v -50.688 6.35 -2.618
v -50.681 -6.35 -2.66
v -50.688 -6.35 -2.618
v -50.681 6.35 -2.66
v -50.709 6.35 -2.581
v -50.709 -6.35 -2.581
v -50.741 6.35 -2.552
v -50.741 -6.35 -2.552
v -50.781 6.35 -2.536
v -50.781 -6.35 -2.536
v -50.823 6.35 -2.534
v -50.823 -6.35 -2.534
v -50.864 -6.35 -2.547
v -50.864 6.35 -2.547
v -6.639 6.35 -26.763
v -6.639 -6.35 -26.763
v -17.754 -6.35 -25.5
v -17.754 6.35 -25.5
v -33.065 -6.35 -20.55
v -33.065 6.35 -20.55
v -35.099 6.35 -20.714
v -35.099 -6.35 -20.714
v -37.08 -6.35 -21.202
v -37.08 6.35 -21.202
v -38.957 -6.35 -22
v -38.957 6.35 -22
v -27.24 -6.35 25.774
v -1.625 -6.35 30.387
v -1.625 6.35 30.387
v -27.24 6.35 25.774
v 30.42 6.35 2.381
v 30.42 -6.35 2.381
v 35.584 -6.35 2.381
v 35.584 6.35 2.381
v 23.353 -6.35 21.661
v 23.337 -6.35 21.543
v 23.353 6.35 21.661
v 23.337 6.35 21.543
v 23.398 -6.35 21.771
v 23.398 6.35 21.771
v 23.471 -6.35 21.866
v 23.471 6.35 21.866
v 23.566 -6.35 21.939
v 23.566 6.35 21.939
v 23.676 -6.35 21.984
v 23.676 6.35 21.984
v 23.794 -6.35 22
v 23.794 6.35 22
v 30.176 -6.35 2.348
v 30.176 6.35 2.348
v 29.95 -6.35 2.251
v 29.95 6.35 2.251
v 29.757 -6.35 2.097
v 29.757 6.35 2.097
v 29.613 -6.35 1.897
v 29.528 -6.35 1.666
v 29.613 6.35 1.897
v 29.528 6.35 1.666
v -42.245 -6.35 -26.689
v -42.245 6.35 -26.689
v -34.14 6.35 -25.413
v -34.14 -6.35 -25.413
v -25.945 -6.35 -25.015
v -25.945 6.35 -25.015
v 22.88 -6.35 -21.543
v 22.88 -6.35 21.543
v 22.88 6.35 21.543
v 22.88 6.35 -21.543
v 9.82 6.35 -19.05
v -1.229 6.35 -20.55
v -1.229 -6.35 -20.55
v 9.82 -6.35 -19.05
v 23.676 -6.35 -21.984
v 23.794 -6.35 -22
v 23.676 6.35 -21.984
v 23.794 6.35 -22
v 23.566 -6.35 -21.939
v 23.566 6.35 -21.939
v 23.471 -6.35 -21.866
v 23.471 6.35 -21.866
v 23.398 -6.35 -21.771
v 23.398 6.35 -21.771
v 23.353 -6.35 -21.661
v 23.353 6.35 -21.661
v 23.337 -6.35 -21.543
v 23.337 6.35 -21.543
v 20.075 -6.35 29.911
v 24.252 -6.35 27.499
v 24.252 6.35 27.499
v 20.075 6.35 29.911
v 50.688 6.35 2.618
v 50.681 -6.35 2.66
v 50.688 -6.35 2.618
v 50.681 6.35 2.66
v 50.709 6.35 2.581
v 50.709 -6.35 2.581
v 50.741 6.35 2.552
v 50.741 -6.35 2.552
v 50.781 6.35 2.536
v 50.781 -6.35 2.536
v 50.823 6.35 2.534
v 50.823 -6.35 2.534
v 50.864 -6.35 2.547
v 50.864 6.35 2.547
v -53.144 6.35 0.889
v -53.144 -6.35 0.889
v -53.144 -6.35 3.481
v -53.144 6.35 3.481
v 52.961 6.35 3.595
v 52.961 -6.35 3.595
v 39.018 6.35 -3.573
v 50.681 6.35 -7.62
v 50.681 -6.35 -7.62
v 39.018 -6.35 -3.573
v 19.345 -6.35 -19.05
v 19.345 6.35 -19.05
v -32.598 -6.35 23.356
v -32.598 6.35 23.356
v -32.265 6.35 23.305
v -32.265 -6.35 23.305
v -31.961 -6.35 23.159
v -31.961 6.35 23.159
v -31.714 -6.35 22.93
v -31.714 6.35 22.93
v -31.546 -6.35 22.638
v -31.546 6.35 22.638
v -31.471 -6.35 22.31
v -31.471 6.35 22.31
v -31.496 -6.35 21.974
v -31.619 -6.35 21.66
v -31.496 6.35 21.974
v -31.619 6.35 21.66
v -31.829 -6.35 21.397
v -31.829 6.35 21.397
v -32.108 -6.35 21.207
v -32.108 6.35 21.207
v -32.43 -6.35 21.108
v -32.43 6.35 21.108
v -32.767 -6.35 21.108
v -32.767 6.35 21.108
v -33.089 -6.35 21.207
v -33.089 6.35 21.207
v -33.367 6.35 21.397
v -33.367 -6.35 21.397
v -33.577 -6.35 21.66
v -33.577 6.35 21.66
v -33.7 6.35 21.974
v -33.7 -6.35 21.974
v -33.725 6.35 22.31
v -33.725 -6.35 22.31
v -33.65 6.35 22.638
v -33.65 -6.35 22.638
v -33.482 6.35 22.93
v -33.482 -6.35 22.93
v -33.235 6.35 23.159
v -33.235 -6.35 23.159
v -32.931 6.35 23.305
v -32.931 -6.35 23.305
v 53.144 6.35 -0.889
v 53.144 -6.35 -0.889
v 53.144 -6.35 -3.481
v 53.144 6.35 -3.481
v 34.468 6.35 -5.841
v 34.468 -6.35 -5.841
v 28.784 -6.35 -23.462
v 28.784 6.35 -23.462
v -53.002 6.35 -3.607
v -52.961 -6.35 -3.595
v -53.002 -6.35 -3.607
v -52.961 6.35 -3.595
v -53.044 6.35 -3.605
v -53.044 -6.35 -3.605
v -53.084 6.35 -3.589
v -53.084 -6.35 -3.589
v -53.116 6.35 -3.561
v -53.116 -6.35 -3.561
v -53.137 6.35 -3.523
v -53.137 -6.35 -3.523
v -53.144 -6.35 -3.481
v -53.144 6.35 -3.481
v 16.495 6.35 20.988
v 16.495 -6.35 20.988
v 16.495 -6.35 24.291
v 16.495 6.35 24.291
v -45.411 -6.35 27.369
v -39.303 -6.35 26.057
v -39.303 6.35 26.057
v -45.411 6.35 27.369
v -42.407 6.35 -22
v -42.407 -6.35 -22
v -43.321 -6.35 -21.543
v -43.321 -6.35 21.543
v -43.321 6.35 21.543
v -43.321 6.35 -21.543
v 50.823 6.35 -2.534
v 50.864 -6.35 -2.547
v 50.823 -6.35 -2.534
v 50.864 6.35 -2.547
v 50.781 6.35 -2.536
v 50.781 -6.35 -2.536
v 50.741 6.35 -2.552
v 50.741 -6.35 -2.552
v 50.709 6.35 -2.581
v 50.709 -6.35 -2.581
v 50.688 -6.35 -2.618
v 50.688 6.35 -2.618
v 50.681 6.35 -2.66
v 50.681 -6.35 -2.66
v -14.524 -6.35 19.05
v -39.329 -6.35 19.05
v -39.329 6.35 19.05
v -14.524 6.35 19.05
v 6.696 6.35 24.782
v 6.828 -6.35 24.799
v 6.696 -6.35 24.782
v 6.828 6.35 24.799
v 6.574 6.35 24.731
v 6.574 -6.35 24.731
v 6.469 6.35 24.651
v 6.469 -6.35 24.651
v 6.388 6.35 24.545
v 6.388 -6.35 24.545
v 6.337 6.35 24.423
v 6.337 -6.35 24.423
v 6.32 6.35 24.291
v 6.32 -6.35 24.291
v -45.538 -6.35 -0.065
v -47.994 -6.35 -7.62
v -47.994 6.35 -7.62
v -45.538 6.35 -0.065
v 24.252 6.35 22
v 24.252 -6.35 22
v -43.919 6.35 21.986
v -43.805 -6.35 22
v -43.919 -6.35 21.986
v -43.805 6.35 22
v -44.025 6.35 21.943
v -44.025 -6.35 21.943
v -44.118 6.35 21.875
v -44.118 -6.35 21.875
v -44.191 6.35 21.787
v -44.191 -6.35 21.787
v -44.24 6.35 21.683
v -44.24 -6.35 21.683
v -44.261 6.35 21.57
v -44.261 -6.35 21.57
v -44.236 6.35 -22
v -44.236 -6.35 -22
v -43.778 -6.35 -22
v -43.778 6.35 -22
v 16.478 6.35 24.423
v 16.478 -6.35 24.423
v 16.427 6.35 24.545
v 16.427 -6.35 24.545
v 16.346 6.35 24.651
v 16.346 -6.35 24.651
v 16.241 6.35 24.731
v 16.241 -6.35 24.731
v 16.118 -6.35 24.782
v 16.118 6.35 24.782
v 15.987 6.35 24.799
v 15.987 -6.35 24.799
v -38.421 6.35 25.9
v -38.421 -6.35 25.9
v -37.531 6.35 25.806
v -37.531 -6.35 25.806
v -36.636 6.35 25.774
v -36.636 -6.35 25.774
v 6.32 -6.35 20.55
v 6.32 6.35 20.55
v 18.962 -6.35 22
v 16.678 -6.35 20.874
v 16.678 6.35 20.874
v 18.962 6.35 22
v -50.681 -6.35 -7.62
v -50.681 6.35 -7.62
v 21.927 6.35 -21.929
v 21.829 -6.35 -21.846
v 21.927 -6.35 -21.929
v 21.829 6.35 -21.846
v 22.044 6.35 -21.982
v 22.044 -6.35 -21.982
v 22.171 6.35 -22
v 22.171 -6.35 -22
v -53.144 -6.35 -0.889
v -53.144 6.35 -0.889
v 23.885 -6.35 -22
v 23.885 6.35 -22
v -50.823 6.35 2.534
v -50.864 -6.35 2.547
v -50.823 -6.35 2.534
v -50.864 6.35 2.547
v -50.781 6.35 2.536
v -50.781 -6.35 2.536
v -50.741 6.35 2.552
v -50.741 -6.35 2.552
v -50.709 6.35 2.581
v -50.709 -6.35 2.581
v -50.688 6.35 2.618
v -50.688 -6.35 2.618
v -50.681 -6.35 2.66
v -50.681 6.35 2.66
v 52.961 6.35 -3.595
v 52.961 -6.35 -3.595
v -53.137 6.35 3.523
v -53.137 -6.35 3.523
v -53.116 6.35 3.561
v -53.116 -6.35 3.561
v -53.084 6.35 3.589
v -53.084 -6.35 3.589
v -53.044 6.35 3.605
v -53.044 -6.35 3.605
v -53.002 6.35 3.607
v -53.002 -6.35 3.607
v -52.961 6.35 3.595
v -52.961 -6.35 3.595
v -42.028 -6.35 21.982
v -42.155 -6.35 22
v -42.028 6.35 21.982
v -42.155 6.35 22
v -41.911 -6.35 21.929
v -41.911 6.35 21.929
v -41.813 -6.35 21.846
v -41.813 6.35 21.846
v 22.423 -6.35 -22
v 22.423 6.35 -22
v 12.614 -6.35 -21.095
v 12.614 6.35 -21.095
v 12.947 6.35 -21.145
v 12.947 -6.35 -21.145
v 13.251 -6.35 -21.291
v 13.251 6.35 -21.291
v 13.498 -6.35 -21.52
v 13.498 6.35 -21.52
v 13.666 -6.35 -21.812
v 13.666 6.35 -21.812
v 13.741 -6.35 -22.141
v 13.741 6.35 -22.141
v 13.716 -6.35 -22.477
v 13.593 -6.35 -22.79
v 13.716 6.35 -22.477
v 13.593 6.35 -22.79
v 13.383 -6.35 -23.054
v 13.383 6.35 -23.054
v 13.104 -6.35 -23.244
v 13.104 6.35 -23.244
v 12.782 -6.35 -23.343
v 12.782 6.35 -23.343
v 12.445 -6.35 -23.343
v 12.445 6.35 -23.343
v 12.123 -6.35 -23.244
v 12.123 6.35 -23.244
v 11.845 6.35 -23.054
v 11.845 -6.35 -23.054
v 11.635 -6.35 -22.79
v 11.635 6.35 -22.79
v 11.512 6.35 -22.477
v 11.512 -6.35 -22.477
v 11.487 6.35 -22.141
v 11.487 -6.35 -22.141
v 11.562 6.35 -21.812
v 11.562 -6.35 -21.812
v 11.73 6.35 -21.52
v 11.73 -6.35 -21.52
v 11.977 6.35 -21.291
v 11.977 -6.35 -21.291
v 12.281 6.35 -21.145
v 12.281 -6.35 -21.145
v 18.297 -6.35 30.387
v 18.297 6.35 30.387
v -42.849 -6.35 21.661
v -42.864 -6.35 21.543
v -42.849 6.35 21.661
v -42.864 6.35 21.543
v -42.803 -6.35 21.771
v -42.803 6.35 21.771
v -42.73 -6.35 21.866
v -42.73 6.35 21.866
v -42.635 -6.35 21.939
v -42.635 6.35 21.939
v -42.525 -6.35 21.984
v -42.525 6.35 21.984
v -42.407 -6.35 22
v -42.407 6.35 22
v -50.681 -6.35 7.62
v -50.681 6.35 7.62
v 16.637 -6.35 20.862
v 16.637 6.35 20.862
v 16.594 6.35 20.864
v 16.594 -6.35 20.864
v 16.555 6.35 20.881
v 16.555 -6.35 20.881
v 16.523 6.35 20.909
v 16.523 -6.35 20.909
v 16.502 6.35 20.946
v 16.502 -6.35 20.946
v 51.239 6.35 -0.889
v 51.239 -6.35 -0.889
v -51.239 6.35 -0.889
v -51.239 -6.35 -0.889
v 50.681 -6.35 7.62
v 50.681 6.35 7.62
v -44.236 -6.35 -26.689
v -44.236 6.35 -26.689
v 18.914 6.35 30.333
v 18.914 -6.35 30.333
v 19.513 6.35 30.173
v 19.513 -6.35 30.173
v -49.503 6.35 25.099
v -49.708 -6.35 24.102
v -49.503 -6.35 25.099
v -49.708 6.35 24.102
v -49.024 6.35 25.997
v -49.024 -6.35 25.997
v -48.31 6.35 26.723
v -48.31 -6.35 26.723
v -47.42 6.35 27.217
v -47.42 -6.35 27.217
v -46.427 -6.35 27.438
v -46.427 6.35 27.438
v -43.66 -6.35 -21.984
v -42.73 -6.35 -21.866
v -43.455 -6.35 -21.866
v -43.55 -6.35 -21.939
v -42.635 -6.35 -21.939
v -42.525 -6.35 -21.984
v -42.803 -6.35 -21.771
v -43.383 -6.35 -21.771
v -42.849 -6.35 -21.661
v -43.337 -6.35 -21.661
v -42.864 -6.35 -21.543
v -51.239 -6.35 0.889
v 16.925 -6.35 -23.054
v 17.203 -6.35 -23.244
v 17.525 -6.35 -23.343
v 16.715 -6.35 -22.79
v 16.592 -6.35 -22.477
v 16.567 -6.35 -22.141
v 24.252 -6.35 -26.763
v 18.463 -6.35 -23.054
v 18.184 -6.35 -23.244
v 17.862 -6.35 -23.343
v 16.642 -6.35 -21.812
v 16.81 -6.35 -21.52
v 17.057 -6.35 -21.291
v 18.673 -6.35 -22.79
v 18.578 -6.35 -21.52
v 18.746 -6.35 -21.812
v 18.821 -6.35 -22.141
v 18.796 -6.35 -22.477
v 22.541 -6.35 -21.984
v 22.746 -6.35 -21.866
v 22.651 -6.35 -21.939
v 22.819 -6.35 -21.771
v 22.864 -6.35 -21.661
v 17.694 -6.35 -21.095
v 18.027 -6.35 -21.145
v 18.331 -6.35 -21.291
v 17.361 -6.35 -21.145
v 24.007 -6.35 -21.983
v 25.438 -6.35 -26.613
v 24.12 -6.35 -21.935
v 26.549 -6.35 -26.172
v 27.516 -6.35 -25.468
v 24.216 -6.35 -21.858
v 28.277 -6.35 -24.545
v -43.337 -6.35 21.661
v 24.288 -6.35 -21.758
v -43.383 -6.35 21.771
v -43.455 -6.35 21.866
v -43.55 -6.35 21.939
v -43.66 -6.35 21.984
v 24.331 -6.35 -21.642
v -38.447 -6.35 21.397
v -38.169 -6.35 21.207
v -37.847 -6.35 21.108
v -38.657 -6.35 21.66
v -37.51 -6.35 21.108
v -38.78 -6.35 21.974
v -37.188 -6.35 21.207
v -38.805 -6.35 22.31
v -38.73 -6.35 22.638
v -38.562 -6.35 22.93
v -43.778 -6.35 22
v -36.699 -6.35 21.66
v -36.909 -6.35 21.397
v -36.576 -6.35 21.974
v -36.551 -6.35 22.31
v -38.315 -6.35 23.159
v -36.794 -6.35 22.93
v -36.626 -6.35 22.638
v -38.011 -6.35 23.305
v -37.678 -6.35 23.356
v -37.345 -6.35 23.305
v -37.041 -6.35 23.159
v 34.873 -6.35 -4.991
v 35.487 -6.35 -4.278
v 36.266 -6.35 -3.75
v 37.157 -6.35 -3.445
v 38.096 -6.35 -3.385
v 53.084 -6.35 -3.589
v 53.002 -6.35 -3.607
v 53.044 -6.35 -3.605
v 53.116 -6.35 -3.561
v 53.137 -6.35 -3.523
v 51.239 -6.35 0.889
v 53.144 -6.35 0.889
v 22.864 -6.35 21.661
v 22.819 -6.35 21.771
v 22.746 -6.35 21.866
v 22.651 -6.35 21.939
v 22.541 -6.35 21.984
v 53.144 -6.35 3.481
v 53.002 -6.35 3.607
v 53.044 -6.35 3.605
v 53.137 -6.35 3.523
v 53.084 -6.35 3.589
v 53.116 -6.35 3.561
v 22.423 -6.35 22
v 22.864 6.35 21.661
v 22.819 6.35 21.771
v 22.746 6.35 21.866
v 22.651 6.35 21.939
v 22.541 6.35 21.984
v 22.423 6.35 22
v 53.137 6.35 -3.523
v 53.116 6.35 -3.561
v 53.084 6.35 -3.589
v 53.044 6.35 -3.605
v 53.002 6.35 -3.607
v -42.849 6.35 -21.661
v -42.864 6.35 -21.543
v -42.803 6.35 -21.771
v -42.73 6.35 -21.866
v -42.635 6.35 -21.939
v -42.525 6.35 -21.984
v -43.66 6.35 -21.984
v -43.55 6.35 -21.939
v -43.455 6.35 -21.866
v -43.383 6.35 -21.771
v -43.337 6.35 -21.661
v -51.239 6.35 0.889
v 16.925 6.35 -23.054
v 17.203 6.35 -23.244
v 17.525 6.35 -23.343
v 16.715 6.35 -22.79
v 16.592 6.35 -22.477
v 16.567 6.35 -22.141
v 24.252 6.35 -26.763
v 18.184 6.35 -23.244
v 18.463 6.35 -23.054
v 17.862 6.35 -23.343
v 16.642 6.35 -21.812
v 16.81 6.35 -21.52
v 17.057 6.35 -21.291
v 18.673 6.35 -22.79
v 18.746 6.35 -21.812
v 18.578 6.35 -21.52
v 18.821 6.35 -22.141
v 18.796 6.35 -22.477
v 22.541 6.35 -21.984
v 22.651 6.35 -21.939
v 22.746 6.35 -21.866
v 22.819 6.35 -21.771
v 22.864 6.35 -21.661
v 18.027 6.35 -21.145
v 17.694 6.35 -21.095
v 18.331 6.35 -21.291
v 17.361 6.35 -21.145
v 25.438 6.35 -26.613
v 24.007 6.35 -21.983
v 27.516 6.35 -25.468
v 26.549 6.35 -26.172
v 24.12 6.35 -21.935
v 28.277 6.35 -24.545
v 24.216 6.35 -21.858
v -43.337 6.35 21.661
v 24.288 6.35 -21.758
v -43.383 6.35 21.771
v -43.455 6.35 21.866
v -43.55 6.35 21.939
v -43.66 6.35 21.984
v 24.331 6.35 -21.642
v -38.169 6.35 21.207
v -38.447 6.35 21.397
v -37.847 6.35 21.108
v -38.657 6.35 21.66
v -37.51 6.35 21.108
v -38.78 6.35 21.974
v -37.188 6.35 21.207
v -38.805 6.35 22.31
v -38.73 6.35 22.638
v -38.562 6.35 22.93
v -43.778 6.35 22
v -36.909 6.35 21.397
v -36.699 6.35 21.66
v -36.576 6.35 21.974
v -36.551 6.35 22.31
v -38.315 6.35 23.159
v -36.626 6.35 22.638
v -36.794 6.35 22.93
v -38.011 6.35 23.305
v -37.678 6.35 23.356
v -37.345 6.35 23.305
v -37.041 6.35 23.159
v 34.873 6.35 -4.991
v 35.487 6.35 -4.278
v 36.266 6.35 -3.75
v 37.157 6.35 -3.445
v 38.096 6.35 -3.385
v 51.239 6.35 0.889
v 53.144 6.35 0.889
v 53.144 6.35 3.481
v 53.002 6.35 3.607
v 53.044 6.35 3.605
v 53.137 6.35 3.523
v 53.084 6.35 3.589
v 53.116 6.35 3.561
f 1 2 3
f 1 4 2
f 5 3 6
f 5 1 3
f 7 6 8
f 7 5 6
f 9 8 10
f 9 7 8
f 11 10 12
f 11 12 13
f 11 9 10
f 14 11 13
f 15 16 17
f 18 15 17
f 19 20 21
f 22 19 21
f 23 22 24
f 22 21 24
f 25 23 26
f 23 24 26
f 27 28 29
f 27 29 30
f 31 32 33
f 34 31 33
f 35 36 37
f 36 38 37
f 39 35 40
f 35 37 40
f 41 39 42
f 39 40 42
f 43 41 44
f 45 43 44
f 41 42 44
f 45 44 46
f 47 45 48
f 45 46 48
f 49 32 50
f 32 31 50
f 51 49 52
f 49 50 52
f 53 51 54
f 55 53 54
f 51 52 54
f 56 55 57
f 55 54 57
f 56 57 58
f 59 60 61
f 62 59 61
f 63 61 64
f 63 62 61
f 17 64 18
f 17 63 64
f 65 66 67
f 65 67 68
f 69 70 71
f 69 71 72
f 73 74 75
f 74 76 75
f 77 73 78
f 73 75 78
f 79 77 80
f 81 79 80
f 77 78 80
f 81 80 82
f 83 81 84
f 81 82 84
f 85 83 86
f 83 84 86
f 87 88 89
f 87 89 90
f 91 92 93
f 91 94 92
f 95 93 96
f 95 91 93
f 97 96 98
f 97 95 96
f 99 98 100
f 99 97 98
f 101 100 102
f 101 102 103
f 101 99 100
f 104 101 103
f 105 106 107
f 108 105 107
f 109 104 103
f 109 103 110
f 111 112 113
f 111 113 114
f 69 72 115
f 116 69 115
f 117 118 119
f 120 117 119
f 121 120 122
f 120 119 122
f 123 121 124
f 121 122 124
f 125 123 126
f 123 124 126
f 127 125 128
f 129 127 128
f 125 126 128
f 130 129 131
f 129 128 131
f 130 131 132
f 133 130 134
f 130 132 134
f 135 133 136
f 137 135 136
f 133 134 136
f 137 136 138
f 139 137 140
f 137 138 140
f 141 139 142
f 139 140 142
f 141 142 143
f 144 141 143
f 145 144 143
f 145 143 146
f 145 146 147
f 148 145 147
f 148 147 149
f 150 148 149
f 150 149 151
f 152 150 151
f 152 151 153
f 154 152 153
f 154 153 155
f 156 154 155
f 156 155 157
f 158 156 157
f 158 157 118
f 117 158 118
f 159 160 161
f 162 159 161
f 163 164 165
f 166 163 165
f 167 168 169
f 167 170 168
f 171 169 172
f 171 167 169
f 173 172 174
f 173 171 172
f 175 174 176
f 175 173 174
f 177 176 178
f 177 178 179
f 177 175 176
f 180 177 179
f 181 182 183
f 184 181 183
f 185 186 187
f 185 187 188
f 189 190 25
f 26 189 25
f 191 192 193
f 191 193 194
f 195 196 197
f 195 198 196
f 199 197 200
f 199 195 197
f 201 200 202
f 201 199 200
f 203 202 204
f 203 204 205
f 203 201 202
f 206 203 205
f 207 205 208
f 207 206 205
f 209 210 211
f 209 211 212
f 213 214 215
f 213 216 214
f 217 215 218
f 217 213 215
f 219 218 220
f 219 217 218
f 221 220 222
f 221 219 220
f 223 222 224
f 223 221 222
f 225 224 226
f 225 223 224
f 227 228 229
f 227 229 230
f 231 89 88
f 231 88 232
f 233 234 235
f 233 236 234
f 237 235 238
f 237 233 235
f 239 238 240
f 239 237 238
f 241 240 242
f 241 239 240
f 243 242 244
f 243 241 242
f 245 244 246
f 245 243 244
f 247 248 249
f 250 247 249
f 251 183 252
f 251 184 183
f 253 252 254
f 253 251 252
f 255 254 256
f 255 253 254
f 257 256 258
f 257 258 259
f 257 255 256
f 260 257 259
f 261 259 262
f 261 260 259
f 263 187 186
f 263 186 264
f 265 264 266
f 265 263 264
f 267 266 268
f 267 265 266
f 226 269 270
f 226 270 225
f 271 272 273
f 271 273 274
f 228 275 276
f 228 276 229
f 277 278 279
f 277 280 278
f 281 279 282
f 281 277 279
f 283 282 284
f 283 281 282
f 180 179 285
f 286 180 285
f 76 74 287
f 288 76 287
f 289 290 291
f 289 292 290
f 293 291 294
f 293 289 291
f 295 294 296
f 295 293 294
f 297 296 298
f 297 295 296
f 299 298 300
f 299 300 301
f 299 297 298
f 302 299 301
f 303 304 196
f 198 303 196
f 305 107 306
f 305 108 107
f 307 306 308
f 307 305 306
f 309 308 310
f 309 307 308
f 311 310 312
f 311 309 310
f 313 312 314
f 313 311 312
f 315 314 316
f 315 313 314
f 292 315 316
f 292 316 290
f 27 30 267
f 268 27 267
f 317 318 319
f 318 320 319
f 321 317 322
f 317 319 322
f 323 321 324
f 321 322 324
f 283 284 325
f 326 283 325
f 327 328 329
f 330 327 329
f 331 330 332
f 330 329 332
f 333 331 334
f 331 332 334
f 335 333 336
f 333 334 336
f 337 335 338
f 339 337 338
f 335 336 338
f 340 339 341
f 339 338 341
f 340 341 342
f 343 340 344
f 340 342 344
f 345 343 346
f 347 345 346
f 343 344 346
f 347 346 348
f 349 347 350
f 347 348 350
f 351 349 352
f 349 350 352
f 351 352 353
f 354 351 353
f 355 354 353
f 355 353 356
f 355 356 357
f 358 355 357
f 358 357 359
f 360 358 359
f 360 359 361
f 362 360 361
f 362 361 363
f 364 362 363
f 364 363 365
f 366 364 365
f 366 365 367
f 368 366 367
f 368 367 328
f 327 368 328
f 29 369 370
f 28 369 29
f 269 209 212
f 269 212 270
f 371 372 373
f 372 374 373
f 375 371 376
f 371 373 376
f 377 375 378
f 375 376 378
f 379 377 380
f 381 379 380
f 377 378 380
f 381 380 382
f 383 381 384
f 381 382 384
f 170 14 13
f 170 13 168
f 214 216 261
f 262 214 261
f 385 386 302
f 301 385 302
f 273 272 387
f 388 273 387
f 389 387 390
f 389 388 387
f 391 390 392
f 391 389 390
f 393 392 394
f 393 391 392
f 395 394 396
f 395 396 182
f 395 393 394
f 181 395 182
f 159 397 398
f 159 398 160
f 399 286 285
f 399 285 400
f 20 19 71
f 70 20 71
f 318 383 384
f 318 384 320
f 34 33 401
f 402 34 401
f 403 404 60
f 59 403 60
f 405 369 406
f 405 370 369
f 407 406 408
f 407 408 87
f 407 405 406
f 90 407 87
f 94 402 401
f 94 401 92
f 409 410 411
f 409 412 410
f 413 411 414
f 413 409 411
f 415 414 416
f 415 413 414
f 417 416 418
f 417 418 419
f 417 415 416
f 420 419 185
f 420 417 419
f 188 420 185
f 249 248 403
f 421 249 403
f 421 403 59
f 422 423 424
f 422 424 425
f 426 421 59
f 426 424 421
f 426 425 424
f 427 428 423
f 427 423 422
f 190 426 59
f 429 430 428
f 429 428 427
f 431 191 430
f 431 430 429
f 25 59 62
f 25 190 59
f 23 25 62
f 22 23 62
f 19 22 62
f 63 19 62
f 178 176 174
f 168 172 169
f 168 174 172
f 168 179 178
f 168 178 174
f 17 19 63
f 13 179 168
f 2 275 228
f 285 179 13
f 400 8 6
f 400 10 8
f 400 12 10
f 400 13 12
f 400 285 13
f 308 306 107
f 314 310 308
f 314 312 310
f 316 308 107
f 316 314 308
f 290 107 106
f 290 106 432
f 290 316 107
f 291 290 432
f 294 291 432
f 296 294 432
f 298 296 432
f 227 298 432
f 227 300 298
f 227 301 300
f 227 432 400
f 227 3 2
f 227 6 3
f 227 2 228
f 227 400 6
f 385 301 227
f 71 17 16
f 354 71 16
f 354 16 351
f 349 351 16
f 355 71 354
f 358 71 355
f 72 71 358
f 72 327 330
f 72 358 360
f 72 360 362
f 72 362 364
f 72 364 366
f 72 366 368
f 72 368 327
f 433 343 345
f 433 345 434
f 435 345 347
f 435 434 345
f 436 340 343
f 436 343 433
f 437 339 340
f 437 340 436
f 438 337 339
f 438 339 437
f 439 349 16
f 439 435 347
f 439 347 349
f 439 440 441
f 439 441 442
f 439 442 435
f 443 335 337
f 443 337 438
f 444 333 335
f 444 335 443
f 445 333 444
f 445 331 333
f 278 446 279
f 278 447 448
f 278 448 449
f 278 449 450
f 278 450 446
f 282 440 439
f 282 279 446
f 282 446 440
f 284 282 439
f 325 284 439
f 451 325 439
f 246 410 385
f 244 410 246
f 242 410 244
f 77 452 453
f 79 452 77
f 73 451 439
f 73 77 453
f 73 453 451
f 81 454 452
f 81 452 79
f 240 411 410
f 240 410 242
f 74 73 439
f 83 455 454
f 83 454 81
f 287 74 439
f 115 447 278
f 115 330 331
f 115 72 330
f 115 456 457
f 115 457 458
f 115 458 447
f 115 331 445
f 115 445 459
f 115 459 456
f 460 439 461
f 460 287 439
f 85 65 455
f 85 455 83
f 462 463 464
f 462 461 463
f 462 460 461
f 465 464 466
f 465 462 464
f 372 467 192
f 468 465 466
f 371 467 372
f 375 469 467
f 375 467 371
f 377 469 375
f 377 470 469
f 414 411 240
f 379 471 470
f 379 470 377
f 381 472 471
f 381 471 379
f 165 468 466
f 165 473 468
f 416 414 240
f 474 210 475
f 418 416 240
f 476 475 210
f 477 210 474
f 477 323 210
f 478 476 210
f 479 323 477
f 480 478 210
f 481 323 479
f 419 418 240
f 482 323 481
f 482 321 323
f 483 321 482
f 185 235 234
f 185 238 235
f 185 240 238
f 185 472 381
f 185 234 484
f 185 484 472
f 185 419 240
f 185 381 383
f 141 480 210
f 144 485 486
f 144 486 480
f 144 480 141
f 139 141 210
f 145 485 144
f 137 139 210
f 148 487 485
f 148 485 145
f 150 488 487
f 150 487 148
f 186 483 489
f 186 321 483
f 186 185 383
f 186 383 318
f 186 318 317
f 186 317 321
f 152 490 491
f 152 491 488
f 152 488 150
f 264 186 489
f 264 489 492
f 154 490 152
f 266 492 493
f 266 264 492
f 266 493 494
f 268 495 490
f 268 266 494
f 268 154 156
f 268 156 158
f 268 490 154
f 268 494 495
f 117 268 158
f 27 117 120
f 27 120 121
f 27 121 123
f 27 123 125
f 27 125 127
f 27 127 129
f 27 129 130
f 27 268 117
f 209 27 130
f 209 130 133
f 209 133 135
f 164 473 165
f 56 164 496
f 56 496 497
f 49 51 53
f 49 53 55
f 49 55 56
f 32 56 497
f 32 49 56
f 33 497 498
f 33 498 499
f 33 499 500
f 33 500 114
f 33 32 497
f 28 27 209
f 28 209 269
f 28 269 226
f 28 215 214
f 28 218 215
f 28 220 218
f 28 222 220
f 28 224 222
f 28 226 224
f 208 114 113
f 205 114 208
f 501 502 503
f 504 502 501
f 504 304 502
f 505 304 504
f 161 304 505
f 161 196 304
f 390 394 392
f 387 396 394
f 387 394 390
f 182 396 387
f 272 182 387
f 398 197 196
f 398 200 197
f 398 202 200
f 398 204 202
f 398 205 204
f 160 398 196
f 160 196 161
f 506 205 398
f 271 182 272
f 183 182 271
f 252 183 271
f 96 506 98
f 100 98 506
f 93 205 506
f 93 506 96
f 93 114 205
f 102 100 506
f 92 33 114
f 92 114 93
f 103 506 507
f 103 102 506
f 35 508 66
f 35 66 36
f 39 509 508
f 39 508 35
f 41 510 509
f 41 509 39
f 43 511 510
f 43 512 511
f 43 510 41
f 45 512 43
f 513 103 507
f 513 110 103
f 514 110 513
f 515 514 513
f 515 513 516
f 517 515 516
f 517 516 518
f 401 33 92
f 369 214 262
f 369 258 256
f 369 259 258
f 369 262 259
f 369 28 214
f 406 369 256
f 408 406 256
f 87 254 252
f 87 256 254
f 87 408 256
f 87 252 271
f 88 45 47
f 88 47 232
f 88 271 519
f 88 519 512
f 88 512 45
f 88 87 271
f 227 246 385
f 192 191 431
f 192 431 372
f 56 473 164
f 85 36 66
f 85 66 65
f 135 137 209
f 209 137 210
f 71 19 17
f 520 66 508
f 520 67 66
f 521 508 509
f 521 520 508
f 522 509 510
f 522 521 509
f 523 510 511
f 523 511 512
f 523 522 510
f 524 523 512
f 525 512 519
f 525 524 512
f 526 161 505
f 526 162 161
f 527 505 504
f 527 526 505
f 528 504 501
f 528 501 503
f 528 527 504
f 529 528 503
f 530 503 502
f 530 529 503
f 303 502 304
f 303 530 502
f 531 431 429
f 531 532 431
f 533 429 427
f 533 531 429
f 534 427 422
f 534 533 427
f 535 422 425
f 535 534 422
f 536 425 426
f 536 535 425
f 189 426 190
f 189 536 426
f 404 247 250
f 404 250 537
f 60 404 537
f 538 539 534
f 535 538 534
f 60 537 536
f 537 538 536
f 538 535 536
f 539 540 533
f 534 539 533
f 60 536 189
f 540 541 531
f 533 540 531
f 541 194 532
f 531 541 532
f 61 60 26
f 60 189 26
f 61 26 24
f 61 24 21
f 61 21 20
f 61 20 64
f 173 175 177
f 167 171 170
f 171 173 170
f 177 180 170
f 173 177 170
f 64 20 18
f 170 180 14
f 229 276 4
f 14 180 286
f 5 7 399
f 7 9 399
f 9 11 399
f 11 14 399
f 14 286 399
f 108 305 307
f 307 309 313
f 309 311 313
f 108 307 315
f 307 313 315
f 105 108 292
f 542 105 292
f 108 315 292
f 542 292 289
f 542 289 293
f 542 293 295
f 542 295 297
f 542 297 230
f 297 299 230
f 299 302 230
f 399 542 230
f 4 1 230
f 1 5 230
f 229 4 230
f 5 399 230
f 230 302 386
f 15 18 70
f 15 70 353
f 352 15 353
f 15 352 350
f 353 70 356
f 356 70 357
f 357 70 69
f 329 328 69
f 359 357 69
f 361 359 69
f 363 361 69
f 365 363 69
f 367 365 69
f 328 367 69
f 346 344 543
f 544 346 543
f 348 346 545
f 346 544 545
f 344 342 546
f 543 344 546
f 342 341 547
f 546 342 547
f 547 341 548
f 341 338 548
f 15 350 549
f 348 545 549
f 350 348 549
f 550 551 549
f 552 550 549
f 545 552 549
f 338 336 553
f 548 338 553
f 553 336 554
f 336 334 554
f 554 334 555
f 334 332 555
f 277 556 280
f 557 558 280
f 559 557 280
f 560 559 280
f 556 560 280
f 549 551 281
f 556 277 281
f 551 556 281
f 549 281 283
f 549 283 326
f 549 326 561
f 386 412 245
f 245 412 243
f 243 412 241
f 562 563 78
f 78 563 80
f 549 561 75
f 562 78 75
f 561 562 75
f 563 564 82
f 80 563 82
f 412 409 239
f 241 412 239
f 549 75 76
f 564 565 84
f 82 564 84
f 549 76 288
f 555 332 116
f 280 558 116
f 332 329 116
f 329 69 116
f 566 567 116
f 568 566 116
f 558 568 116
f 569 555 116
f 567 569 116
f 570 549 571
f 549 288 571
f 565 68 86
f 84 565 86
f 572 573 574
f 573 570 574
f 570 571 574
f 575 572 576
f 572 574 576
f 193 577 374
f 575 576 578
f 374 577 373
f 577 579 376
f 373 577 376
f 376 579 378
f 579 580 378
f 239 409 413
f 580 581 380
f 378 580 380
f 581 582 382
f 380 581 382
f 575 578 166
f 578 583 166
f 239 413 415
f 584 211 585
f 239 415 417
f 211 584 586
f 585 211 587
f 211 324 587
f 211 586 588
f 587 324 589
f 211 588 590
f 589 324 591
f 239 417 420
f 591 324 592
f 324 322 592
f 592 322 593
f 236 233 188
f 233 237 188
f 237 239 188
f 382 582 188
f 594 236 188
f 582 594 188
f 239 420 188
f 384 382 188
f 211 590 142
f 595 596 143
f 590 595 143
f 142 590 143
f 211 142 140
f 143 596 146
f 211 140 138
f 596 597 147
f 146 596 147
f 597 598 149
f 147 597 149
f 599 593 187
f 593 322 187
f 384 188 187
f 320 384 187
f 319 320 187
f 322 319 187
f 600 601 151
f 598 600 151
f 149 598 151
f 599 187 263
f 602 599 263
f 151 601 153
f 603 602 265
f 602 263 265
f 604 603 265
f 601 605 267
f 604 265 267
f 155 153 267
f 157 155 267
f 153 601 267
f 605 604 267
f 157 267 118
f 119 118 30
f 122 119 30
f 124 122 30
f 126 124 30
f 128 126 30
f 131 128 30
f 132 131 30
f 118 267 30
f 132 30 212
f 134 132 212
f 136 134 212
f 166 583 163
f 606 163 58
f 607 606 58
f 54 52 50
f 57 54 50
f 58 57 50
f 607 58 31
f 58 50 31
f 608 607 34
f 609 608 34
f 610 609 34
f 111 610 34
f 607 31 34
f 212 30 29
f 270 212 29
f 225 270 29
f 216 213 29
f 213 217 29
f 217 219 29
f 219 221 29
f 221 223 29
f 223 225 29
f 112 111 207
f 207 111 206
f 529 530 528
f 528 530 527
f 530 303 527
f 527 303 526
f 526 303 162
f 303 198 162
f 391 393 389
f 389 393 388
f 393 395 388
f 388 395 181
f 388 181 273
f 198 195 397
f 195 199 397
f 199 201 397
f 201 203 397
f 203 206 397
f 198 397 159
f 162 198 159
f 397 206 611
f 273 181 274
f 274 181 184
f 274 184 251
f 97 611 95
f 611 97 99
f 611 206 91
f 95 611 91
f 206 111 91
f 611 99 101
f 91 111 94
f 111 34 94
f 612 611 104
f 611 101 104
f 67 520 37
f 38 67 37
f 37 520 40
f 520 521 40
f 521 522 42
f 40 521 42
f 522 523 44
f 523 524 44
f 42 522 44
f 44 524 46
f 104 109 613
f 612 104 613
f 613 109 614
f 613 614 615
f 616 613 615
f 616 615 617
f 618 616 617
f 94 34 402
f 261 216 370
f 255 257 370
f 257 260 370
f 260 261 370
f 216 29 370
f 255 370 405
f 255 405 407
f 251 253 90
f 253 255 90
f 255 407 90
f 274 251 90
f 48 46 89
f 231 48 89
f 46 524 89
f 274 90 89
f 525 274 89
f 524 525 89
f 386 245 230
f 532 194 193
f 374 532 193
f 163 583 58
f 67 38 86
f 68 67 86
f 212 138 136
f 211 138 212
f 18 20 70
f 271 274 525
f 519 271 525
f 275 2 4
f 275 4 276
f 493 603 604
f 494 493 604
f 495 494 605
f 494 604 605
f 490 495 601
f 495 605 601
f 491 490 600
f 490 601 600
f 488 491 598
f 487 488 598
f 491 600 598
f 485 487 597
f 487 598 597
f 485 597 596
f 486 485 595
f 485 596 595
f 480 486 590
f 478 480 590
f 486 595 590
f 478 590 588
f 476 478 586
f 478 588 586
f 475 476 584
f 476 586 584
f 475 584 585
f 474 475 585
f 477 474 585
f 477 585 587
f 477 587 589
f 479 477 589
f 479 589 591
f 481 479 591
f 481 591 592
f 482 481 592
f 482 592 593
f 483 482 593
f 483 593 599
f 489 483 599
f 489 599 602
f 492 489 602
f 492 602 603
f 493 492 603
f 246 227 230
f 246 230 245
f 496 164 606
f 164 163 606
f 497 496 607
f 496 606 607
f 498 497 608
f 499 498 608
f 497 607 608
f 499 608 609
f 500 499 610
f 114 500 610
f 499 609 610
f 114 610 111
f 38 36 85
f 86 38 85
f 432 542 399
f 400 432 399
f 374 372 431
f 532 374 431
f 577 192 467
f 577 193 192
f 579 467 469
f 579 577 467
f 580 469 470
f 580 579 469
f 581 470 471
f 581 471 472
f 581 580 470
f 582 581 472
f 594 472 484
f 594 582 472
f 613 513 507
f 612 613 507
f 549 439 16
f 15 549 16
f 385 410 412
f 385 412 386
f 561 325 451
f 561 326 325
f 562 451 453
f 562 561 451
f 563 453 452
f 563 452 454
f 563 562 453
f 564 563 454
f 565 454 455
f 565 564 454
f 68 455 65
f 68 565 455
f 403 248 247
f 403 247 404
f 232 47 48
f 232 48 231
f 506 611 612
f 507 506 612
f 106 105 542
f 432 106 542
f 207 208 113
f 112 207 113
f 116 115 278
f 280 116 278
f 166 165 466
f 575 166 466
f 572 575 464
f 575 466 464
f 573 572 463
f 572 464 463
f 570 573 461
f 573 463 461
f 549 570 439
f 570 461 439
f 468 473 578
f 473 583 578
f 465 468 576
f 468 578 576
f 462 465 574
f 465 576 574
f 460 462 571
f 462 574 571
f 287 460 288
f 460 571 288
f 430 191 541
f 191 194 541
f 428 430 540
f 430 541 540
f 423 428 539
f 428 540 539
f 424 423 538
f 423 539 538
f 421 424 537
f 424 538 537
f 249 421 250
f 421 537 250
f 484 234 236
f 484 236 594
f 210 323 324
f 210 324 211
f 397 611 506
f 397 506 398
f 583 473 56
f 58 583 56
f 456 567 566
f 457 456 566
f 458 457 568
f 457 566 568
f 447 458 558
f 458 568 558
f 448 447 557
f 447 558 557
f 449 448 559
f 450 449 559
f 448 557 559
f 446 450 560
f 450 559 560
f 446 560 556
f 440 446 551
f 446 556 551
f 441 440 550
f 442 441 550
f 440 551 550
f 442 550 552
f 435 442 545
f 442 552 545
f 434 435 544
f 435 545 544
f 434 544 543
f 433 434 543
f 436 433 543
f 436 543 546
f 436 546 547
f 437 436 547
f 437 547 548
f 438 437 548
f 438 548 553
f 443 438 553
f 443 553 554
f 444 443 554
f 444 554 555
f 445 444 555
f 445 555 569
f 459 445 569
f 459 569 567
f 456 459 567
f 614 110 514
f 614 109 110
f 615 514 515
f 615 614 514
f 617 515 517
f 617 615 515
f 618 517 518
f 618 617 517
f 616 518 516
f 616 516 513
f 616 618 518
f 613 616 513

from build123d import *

# Parameters (mm, degrees)
BOSS_EXTRUDE1_DEPTH        = 6.35
BOSS_EXTRUDE1_DEPTH_BACK   = 6.35
BOSS_EXTRUDE1_2_DEPTH      = 6.35
BOSS_EXTRUDE1_2_DEPTH_BACK = 6.35
BOSS_EXTRUDE2_DEPTH        = 6.35
BOSS_EXTRUDE2_DEPTH_BACK   = 6.35
SKETCH3_W                  = 0.4572
SKETCH3_H                  = 44.508
BOSS_EXTRUDE4_DEPTH        = 6.35
BOSS_EXTRUDE4_DEPTH_BACK   = 6.35
SKETCH8_W                  = 2.032
SKETCH8_H                  = 1.778
CUT_EXTRUDE1_DEPTH         = 63.522062345
FILLET1_R                  = 0.4572
FILLET2_R                  = 0.9144
FILLET3_R                  = 3.556
FILLET6_R                  = 12.7
SKETCH9_R                  = 1.1303
CUT_EXTRUDE2_DEPTH         = 63.522062345
FILLET7_R                  = 0.127
FILLET8_R                  = 0.508
FILLET9_R                  = 76.2
SKETCH12_W                 = 3.975578287
SKETCH12_H                 = 4.68929279
SKETCH12_W_2               = 5.470600001
SKETCH12_H_2               = 8.387314833
CUT_EXTRUDE3_DEPTH         = 63.522062345
FILLET10_R                 = 0.127


with BuildPart() as part:
    # Sketch2 → Boss-Extrude1 (new, two sides: drawn at the far end of the back side and taken through both)
    with BuildSketch(Plane(origin=(0, 0, 0), x_dir=(1, 0, 0), z_dir=(0, 1, 0)).offset(-BOSS_EXTRUDE1_DEPTH_BACK)):
        with BuildLine():
            Line((9.819911786, 19.050210052), (19.344911786, 19.050210052))
            Line((19.344911786, 19.050210052), (21.965511899, 22))
            Line((21.965511899, 22), (24.251511899, 22))
            Line((24.251511899, 22), (29.687111899, -2.381342584))
            Line((29.687111899, -2.381342584), (35.584296061, -2.381342584))
            Line((35.584296061, -2.381342584), (50.68062, -7.62))
            Line((50.68062, -7.62), (50.68062, 7.62))
            Line((50.68062, 7.62), (35.584296061, 2.381342584))
            Line((35.584296061, 2.381342584), (28.784210924, 23.462125012))
            ThreePointArc((28.784210924, 23.462125012), (27.055039043, 25.850117603), (24.251511899, 26.762685167))
            Line((24.251511899, 26.762685167), (-6.638632099, 26.762685167))
            Line((-6.638632099, 26.762685167), (-30.153140375, 24.092168337))
            Line((-30.153140375, 24.092168337), (-42.245281802, 26.68929279))
            Line((-42.245281802, 26.68929279), (-48.211266614, 26.68929279))
            Line((-48.211266614, 26.68929279), (-48.211266614, 22))
            Line((-48.211266614, 22), (-38.957383068, 22))
            Line((-38.957383068, 22), (-36.496303445, 20.550210052))
            Line((-36.496303445, 20.550210052), (-1.229088214, 20.550210052))
            Line((-1.229088214, 20.550210052), (9.819911786, 19.050210052))
        make_face()
    extrude(amount=BOSS_EXTRUDE1_DEPTH + BOSS_EXTRUDE1_DEPTH_BACK)



with BuildPart() as body_2:
    # Sketch2 → Boss-Extrude1 2 (new, two sides: drawn at the far end of the back side and taken through both)
    with BuildSketch(Plane(origin=(0, 0, 0), x_dir=(1, 0, 0), z_dir=(0, 1, 0)).offset(-BOSS_EXTRUDE1_2_DEPTH_BACK)):
        Polygon((-50.68062, 7.62), (-47.994229245, 7.62), (-45.538273994, 0.064709726), (-44.235688327, -22), (-41.949688327, -22), (-39.329088214, -19.050210052), (-14.524057774, -19.050210052), (6.319911674, -20.5502101), (6.319911674, -24.799314833), (16.494911898, -24.799314833), (16.494911898, -22), (16.494911898, -20.7842203), (18.962447951, -22), (29.7221119, -22), (29.7221119, -24.341022744), (19.249626804, -30.387314833), (-1.624639293, -30.387314833), (-27.239820872, -25.774174137), (-37.984514025, -25.774174137), (-49.463347649, -28.239573642), (-50.68062, -7.62), align=None)
    extrude(amount=BOSS_EXTRUDE1_2_DEPTH + BOSS_EXTRUDE1_2_DEPTH_BACK)


with BuildPart() as part_1:
    add(part.part)

    add(body_2.part)  # Boss-Extrude2 merges body 2
    # Sketch3 → Boss-Extrude2 (add, two sides: drawn at the far end of the back side and taken through both)
    with BuildSketch(Plane(origin=(0, 0, 0), x_dir=(1, 0, 0), z_dir=(0, 1, 0)).offset(-BOSS_EXTRUDE2_DEPTH_BACK)):
        with Locations((-43.092688327, 0.254)):
            Rectangle(SKETCH3_W, SKETCH3_H)
        with Locations((23.108511899, 0.254)):
            Rectangle(SKETCH3_W, SKETCH3_H)
    extrude(amount=BOSS_EXTRUDE2_DEPTH + BOSS_EXTRUDE2_DEPTH_BACK)

    # Sketch7 → Boss-Extrude4 (add, two sides: drawn at the far end of the back side and taken through both)
    with BuildSketch(Plane(origin=(0, 0, 0), x_dir=(1, 0, 0), z_dir=(0, 1, 0)).offset(-BOSS_EXTRUDE4_DEPTH_BACK)):
        Polygon((-53.14442, 3.68670581), (-53.14442, -3.68670581), (-50.75682, -2.49290581), (-50.68062, -2.45480581), (-50.68062, 2.45480581), (-50.75682, 2.49290581), align=None)
        Polygon((50.68062, 2.45480581), (50.68062, -2.45480581), (50.75682, -2.49290581), (53.14442, -3.68670581), (53.14442, 3.68670581), (50.75682, 2.49290581), align=None)
    extrude(amount=BOSS_EXTRUDE4_DEPTH + BOSS_EXTRUDE4_DEPTH_BACK)

    # Sketch8 → Cut-Extrude1 (cut, through all)
    with BuildSketch(Plane(origin=(0, 6.35, 0), x_dir=(1, 0, 0), z_dir=(0, 1, 0))):
        with Locations((-52.25542, 0)):
            Rectangle(SKETCH8_W, SKETCH8_H)
        with Locations((52.25542, 0)):
            Rectangle(SKETCH8_W, SKETCH8_H)
    extrude(amount=-CUT_EXTRUDE1_DEPTH, mode=Mode.SUBTRACT)

    # Fillet1
    fillet1_edges = [part_1.edges().sort_by_distance(p)[0] for p in [
        (-43.321288327, 0, -22),
        (24.251511899, 0, -22),
        (21.965511899, 0, -22),
        (-42.864088327, 0, -22),
        (23.337111899, 0, -22),
        (22.879911899, 0, -22),
        (22.879911899, 0, 22),
        (23.337111899, 0, 22),
        (-44.235688327, 0, 22),
        (-41.949688327, 0, 22),
        (-42.864088327, 0, 22),
        (-43.321288327, 0, 22),
    ]]
    fillet(fillet1_edges, radius=FILLET1_R)

    # Fillet2
    fillet2_edges = [part_1.edges().sort_by_distance(p)[0] for p in [
        (29.687111899, 0, 2.381342584),
        (-48.211266614, 0, -22),
        (-48.211266614, 0, -26.68929279),
        (29.7221119, 0, 22),
        (29.7221119, 0, 24.341022744),
    ]]
    fillet(fillet2_edges, radius=FILLET2_R)

    # Fillet3
    fillet3_edges = [part_1.edges().sort_by_distance(p)[0] for p in [
        (35.584296061, 0, -2.381342584),
        (19.249626804, 0, 30.387314833),
        (-49.463347649, 0, 28.239573642),
    ]]
    fillet(fillet3_edges, radius=FILLET3_R)

    # Fillet6
    # the kernel refuses this fillet: 12.7 mm, written as the material it adds along each edge
    with BuildSketch(Plane(origin=(-37.984514025, 6.35, 25.774174137), x_dir=(1, 0, 0), z_dir=(0, -1, 0))) as fillet6_piece_1:
        with BuildLine():
            CenterArc((FILLET6_R * 0.106178254311, FILLET6_R), FILLET6_R, 257.878284844, 12.121715156)
            Line((-FILLET6_R * 0.103810874318, FILLET6_R * 0.0222962791022), (0, 0))
            Line((0, 0), (FILLET6_R * 0.106178254311, 0))
        make_face()
    extrude(amount=12.7)
    # the kernel refuses this fillet: 12.7 mm, written as the material it takes off along each edge
    with BuildSketch(Plane(origin=(-36.496303445, 14.928809219, -20.550210052), x_dir=(-0.8616133508003352, 0, -0.507565201449645), z_dir=(0, -1, 0))) as fillet6_2_piece_1:
        with BuildLine():
            CenterArc((3.489431436, 12.684211567), FILLET6_R, 239.498215304, 27.644521231)
            Line((-2.956646623, 1.741722012), (0, 0))
            Line((0, 0), (2.856361988, 0))
        make_face()
    extrude(amount=29.857618438, mode=Mode.SUBTRACT)

    # Sketch9 → Cut-Extrude2 (cut, through all)
    with BuildSketch(Plane(origin=(0, 6.35, 0), x_dir=(1, 0, 0), z_dir=(0, 1, 0))):
        with Locations(Location((-37.678088214, -22.225210052, 0), (0, 0, 270))):
            Circle(SKETCH9_R)
        with Locations(Location((-32.598088214, -22.225210052, 0), (0, 0, 270))):
            Circle(SKETCH9_R)
        with Locations(Location((12.613911786, 22.225210052, 0), (0, 0, 270))):
            Circle(SKETCH9_R)
        with Locations(Location((17.693911786, 22.225210052, 0), (0, 0, 270))):
            Circle(SKETCH9_R)
    extrude(amount=-CUT_EXTRUDE2_DEPTH, mode=Mode.SUBTRACT)

    # Fillet7
    fillet7_edges = [part_1.edges().sort_by_distance(p)[0] for p in [
        (16.494911898, 0, 20.7842203),
    ]]
    fillet(fillet7_edges, radius=FILLET7_R)

    # Fillet8
    fillet8_edges = [part_1.edges().sort_by_distance(p)[0] for p in [
        (6.319911674, 0, 24.799314833),
        (16.494911898, 0, 24.799314833),
    ]]
    fillet(fillet8_edges, radius=FILLET8_R)

    # Fillet9
    # the kernel refuses this fillet: 76.2 mm, written as the material it adds along each edge
    with BuildSketch(Plane(origin=(-30.153140375, -6.35, -24.092168337), x_dir=(-0.9777037208978189, 0, -0.20998912862945954), z_dir=(0, 1, 0))) as fillet9_piece_1_section:
        with BuildLine():
            CenterArc((FILLET9_R * 0.16376499609, -FILLET9_R), FILLET9_R, 90, 18.600972695)
            Line((-FILLET9_R * 0.155210403169, -FILLET9_R * 0.0522370050125), (0, 0))
            Line((0, 0), (FILLET9_R * 0.16376499609, 0))
        make_face()
    fillet9_piece_1 = extrude(amount=12.7, mode=Mode.PRIVATE)
    fillet9_piece_1 = split(fillet9_piece_1, bisect_by=Plane(origin=(-30.153140375, -6.35, -26.68929279), z_dir=(0, 0, 1)), keep=Keep.TOP, mode=Mode.PRIVATE)
    add(fillet9_piece_1)

    # Sketch12 → Cut-Extrude3 (cut, through all)
    with BuildSketch(Plane(origin=(0, 6.35, 0), x_dir=(1, 0, 0), z_dir=(0, 1, 0))):
        with Locations((-46.223477471, 24.344646395)):
            Rectangle(SKETCH12_W, SKETCH12_H)
        with Locations((26.9868119, -26.193657417)):
            Rectangle(SKETCH12_W_2, SKETCH12_H_2)
    extrude(amount=-CUT_EXTRUDE3_DEPTH, mode=Mode.SUBTRACT)

    # Fillet10
    fillet10_edges = [part_1.edges().sort_by_distance(p)[0] for p in [
        (50.68062, 0, -2.45480581),
        (50.68062, 0, 2.45480581),
        (53.14442, 0, 3.68670581),
        (53.14442, 0, -3.68670581),
        (-50.68062, 0, 2.45480581),
        (-50.68062, 0, -2.45480581),
        (-53.14442, 0, -3.68670581),
        (-53.14442, 0, 3.68670581),
    ]]
    fillet(fillet10_edges, radius=FILLET10_R)


solid = part_1.part
